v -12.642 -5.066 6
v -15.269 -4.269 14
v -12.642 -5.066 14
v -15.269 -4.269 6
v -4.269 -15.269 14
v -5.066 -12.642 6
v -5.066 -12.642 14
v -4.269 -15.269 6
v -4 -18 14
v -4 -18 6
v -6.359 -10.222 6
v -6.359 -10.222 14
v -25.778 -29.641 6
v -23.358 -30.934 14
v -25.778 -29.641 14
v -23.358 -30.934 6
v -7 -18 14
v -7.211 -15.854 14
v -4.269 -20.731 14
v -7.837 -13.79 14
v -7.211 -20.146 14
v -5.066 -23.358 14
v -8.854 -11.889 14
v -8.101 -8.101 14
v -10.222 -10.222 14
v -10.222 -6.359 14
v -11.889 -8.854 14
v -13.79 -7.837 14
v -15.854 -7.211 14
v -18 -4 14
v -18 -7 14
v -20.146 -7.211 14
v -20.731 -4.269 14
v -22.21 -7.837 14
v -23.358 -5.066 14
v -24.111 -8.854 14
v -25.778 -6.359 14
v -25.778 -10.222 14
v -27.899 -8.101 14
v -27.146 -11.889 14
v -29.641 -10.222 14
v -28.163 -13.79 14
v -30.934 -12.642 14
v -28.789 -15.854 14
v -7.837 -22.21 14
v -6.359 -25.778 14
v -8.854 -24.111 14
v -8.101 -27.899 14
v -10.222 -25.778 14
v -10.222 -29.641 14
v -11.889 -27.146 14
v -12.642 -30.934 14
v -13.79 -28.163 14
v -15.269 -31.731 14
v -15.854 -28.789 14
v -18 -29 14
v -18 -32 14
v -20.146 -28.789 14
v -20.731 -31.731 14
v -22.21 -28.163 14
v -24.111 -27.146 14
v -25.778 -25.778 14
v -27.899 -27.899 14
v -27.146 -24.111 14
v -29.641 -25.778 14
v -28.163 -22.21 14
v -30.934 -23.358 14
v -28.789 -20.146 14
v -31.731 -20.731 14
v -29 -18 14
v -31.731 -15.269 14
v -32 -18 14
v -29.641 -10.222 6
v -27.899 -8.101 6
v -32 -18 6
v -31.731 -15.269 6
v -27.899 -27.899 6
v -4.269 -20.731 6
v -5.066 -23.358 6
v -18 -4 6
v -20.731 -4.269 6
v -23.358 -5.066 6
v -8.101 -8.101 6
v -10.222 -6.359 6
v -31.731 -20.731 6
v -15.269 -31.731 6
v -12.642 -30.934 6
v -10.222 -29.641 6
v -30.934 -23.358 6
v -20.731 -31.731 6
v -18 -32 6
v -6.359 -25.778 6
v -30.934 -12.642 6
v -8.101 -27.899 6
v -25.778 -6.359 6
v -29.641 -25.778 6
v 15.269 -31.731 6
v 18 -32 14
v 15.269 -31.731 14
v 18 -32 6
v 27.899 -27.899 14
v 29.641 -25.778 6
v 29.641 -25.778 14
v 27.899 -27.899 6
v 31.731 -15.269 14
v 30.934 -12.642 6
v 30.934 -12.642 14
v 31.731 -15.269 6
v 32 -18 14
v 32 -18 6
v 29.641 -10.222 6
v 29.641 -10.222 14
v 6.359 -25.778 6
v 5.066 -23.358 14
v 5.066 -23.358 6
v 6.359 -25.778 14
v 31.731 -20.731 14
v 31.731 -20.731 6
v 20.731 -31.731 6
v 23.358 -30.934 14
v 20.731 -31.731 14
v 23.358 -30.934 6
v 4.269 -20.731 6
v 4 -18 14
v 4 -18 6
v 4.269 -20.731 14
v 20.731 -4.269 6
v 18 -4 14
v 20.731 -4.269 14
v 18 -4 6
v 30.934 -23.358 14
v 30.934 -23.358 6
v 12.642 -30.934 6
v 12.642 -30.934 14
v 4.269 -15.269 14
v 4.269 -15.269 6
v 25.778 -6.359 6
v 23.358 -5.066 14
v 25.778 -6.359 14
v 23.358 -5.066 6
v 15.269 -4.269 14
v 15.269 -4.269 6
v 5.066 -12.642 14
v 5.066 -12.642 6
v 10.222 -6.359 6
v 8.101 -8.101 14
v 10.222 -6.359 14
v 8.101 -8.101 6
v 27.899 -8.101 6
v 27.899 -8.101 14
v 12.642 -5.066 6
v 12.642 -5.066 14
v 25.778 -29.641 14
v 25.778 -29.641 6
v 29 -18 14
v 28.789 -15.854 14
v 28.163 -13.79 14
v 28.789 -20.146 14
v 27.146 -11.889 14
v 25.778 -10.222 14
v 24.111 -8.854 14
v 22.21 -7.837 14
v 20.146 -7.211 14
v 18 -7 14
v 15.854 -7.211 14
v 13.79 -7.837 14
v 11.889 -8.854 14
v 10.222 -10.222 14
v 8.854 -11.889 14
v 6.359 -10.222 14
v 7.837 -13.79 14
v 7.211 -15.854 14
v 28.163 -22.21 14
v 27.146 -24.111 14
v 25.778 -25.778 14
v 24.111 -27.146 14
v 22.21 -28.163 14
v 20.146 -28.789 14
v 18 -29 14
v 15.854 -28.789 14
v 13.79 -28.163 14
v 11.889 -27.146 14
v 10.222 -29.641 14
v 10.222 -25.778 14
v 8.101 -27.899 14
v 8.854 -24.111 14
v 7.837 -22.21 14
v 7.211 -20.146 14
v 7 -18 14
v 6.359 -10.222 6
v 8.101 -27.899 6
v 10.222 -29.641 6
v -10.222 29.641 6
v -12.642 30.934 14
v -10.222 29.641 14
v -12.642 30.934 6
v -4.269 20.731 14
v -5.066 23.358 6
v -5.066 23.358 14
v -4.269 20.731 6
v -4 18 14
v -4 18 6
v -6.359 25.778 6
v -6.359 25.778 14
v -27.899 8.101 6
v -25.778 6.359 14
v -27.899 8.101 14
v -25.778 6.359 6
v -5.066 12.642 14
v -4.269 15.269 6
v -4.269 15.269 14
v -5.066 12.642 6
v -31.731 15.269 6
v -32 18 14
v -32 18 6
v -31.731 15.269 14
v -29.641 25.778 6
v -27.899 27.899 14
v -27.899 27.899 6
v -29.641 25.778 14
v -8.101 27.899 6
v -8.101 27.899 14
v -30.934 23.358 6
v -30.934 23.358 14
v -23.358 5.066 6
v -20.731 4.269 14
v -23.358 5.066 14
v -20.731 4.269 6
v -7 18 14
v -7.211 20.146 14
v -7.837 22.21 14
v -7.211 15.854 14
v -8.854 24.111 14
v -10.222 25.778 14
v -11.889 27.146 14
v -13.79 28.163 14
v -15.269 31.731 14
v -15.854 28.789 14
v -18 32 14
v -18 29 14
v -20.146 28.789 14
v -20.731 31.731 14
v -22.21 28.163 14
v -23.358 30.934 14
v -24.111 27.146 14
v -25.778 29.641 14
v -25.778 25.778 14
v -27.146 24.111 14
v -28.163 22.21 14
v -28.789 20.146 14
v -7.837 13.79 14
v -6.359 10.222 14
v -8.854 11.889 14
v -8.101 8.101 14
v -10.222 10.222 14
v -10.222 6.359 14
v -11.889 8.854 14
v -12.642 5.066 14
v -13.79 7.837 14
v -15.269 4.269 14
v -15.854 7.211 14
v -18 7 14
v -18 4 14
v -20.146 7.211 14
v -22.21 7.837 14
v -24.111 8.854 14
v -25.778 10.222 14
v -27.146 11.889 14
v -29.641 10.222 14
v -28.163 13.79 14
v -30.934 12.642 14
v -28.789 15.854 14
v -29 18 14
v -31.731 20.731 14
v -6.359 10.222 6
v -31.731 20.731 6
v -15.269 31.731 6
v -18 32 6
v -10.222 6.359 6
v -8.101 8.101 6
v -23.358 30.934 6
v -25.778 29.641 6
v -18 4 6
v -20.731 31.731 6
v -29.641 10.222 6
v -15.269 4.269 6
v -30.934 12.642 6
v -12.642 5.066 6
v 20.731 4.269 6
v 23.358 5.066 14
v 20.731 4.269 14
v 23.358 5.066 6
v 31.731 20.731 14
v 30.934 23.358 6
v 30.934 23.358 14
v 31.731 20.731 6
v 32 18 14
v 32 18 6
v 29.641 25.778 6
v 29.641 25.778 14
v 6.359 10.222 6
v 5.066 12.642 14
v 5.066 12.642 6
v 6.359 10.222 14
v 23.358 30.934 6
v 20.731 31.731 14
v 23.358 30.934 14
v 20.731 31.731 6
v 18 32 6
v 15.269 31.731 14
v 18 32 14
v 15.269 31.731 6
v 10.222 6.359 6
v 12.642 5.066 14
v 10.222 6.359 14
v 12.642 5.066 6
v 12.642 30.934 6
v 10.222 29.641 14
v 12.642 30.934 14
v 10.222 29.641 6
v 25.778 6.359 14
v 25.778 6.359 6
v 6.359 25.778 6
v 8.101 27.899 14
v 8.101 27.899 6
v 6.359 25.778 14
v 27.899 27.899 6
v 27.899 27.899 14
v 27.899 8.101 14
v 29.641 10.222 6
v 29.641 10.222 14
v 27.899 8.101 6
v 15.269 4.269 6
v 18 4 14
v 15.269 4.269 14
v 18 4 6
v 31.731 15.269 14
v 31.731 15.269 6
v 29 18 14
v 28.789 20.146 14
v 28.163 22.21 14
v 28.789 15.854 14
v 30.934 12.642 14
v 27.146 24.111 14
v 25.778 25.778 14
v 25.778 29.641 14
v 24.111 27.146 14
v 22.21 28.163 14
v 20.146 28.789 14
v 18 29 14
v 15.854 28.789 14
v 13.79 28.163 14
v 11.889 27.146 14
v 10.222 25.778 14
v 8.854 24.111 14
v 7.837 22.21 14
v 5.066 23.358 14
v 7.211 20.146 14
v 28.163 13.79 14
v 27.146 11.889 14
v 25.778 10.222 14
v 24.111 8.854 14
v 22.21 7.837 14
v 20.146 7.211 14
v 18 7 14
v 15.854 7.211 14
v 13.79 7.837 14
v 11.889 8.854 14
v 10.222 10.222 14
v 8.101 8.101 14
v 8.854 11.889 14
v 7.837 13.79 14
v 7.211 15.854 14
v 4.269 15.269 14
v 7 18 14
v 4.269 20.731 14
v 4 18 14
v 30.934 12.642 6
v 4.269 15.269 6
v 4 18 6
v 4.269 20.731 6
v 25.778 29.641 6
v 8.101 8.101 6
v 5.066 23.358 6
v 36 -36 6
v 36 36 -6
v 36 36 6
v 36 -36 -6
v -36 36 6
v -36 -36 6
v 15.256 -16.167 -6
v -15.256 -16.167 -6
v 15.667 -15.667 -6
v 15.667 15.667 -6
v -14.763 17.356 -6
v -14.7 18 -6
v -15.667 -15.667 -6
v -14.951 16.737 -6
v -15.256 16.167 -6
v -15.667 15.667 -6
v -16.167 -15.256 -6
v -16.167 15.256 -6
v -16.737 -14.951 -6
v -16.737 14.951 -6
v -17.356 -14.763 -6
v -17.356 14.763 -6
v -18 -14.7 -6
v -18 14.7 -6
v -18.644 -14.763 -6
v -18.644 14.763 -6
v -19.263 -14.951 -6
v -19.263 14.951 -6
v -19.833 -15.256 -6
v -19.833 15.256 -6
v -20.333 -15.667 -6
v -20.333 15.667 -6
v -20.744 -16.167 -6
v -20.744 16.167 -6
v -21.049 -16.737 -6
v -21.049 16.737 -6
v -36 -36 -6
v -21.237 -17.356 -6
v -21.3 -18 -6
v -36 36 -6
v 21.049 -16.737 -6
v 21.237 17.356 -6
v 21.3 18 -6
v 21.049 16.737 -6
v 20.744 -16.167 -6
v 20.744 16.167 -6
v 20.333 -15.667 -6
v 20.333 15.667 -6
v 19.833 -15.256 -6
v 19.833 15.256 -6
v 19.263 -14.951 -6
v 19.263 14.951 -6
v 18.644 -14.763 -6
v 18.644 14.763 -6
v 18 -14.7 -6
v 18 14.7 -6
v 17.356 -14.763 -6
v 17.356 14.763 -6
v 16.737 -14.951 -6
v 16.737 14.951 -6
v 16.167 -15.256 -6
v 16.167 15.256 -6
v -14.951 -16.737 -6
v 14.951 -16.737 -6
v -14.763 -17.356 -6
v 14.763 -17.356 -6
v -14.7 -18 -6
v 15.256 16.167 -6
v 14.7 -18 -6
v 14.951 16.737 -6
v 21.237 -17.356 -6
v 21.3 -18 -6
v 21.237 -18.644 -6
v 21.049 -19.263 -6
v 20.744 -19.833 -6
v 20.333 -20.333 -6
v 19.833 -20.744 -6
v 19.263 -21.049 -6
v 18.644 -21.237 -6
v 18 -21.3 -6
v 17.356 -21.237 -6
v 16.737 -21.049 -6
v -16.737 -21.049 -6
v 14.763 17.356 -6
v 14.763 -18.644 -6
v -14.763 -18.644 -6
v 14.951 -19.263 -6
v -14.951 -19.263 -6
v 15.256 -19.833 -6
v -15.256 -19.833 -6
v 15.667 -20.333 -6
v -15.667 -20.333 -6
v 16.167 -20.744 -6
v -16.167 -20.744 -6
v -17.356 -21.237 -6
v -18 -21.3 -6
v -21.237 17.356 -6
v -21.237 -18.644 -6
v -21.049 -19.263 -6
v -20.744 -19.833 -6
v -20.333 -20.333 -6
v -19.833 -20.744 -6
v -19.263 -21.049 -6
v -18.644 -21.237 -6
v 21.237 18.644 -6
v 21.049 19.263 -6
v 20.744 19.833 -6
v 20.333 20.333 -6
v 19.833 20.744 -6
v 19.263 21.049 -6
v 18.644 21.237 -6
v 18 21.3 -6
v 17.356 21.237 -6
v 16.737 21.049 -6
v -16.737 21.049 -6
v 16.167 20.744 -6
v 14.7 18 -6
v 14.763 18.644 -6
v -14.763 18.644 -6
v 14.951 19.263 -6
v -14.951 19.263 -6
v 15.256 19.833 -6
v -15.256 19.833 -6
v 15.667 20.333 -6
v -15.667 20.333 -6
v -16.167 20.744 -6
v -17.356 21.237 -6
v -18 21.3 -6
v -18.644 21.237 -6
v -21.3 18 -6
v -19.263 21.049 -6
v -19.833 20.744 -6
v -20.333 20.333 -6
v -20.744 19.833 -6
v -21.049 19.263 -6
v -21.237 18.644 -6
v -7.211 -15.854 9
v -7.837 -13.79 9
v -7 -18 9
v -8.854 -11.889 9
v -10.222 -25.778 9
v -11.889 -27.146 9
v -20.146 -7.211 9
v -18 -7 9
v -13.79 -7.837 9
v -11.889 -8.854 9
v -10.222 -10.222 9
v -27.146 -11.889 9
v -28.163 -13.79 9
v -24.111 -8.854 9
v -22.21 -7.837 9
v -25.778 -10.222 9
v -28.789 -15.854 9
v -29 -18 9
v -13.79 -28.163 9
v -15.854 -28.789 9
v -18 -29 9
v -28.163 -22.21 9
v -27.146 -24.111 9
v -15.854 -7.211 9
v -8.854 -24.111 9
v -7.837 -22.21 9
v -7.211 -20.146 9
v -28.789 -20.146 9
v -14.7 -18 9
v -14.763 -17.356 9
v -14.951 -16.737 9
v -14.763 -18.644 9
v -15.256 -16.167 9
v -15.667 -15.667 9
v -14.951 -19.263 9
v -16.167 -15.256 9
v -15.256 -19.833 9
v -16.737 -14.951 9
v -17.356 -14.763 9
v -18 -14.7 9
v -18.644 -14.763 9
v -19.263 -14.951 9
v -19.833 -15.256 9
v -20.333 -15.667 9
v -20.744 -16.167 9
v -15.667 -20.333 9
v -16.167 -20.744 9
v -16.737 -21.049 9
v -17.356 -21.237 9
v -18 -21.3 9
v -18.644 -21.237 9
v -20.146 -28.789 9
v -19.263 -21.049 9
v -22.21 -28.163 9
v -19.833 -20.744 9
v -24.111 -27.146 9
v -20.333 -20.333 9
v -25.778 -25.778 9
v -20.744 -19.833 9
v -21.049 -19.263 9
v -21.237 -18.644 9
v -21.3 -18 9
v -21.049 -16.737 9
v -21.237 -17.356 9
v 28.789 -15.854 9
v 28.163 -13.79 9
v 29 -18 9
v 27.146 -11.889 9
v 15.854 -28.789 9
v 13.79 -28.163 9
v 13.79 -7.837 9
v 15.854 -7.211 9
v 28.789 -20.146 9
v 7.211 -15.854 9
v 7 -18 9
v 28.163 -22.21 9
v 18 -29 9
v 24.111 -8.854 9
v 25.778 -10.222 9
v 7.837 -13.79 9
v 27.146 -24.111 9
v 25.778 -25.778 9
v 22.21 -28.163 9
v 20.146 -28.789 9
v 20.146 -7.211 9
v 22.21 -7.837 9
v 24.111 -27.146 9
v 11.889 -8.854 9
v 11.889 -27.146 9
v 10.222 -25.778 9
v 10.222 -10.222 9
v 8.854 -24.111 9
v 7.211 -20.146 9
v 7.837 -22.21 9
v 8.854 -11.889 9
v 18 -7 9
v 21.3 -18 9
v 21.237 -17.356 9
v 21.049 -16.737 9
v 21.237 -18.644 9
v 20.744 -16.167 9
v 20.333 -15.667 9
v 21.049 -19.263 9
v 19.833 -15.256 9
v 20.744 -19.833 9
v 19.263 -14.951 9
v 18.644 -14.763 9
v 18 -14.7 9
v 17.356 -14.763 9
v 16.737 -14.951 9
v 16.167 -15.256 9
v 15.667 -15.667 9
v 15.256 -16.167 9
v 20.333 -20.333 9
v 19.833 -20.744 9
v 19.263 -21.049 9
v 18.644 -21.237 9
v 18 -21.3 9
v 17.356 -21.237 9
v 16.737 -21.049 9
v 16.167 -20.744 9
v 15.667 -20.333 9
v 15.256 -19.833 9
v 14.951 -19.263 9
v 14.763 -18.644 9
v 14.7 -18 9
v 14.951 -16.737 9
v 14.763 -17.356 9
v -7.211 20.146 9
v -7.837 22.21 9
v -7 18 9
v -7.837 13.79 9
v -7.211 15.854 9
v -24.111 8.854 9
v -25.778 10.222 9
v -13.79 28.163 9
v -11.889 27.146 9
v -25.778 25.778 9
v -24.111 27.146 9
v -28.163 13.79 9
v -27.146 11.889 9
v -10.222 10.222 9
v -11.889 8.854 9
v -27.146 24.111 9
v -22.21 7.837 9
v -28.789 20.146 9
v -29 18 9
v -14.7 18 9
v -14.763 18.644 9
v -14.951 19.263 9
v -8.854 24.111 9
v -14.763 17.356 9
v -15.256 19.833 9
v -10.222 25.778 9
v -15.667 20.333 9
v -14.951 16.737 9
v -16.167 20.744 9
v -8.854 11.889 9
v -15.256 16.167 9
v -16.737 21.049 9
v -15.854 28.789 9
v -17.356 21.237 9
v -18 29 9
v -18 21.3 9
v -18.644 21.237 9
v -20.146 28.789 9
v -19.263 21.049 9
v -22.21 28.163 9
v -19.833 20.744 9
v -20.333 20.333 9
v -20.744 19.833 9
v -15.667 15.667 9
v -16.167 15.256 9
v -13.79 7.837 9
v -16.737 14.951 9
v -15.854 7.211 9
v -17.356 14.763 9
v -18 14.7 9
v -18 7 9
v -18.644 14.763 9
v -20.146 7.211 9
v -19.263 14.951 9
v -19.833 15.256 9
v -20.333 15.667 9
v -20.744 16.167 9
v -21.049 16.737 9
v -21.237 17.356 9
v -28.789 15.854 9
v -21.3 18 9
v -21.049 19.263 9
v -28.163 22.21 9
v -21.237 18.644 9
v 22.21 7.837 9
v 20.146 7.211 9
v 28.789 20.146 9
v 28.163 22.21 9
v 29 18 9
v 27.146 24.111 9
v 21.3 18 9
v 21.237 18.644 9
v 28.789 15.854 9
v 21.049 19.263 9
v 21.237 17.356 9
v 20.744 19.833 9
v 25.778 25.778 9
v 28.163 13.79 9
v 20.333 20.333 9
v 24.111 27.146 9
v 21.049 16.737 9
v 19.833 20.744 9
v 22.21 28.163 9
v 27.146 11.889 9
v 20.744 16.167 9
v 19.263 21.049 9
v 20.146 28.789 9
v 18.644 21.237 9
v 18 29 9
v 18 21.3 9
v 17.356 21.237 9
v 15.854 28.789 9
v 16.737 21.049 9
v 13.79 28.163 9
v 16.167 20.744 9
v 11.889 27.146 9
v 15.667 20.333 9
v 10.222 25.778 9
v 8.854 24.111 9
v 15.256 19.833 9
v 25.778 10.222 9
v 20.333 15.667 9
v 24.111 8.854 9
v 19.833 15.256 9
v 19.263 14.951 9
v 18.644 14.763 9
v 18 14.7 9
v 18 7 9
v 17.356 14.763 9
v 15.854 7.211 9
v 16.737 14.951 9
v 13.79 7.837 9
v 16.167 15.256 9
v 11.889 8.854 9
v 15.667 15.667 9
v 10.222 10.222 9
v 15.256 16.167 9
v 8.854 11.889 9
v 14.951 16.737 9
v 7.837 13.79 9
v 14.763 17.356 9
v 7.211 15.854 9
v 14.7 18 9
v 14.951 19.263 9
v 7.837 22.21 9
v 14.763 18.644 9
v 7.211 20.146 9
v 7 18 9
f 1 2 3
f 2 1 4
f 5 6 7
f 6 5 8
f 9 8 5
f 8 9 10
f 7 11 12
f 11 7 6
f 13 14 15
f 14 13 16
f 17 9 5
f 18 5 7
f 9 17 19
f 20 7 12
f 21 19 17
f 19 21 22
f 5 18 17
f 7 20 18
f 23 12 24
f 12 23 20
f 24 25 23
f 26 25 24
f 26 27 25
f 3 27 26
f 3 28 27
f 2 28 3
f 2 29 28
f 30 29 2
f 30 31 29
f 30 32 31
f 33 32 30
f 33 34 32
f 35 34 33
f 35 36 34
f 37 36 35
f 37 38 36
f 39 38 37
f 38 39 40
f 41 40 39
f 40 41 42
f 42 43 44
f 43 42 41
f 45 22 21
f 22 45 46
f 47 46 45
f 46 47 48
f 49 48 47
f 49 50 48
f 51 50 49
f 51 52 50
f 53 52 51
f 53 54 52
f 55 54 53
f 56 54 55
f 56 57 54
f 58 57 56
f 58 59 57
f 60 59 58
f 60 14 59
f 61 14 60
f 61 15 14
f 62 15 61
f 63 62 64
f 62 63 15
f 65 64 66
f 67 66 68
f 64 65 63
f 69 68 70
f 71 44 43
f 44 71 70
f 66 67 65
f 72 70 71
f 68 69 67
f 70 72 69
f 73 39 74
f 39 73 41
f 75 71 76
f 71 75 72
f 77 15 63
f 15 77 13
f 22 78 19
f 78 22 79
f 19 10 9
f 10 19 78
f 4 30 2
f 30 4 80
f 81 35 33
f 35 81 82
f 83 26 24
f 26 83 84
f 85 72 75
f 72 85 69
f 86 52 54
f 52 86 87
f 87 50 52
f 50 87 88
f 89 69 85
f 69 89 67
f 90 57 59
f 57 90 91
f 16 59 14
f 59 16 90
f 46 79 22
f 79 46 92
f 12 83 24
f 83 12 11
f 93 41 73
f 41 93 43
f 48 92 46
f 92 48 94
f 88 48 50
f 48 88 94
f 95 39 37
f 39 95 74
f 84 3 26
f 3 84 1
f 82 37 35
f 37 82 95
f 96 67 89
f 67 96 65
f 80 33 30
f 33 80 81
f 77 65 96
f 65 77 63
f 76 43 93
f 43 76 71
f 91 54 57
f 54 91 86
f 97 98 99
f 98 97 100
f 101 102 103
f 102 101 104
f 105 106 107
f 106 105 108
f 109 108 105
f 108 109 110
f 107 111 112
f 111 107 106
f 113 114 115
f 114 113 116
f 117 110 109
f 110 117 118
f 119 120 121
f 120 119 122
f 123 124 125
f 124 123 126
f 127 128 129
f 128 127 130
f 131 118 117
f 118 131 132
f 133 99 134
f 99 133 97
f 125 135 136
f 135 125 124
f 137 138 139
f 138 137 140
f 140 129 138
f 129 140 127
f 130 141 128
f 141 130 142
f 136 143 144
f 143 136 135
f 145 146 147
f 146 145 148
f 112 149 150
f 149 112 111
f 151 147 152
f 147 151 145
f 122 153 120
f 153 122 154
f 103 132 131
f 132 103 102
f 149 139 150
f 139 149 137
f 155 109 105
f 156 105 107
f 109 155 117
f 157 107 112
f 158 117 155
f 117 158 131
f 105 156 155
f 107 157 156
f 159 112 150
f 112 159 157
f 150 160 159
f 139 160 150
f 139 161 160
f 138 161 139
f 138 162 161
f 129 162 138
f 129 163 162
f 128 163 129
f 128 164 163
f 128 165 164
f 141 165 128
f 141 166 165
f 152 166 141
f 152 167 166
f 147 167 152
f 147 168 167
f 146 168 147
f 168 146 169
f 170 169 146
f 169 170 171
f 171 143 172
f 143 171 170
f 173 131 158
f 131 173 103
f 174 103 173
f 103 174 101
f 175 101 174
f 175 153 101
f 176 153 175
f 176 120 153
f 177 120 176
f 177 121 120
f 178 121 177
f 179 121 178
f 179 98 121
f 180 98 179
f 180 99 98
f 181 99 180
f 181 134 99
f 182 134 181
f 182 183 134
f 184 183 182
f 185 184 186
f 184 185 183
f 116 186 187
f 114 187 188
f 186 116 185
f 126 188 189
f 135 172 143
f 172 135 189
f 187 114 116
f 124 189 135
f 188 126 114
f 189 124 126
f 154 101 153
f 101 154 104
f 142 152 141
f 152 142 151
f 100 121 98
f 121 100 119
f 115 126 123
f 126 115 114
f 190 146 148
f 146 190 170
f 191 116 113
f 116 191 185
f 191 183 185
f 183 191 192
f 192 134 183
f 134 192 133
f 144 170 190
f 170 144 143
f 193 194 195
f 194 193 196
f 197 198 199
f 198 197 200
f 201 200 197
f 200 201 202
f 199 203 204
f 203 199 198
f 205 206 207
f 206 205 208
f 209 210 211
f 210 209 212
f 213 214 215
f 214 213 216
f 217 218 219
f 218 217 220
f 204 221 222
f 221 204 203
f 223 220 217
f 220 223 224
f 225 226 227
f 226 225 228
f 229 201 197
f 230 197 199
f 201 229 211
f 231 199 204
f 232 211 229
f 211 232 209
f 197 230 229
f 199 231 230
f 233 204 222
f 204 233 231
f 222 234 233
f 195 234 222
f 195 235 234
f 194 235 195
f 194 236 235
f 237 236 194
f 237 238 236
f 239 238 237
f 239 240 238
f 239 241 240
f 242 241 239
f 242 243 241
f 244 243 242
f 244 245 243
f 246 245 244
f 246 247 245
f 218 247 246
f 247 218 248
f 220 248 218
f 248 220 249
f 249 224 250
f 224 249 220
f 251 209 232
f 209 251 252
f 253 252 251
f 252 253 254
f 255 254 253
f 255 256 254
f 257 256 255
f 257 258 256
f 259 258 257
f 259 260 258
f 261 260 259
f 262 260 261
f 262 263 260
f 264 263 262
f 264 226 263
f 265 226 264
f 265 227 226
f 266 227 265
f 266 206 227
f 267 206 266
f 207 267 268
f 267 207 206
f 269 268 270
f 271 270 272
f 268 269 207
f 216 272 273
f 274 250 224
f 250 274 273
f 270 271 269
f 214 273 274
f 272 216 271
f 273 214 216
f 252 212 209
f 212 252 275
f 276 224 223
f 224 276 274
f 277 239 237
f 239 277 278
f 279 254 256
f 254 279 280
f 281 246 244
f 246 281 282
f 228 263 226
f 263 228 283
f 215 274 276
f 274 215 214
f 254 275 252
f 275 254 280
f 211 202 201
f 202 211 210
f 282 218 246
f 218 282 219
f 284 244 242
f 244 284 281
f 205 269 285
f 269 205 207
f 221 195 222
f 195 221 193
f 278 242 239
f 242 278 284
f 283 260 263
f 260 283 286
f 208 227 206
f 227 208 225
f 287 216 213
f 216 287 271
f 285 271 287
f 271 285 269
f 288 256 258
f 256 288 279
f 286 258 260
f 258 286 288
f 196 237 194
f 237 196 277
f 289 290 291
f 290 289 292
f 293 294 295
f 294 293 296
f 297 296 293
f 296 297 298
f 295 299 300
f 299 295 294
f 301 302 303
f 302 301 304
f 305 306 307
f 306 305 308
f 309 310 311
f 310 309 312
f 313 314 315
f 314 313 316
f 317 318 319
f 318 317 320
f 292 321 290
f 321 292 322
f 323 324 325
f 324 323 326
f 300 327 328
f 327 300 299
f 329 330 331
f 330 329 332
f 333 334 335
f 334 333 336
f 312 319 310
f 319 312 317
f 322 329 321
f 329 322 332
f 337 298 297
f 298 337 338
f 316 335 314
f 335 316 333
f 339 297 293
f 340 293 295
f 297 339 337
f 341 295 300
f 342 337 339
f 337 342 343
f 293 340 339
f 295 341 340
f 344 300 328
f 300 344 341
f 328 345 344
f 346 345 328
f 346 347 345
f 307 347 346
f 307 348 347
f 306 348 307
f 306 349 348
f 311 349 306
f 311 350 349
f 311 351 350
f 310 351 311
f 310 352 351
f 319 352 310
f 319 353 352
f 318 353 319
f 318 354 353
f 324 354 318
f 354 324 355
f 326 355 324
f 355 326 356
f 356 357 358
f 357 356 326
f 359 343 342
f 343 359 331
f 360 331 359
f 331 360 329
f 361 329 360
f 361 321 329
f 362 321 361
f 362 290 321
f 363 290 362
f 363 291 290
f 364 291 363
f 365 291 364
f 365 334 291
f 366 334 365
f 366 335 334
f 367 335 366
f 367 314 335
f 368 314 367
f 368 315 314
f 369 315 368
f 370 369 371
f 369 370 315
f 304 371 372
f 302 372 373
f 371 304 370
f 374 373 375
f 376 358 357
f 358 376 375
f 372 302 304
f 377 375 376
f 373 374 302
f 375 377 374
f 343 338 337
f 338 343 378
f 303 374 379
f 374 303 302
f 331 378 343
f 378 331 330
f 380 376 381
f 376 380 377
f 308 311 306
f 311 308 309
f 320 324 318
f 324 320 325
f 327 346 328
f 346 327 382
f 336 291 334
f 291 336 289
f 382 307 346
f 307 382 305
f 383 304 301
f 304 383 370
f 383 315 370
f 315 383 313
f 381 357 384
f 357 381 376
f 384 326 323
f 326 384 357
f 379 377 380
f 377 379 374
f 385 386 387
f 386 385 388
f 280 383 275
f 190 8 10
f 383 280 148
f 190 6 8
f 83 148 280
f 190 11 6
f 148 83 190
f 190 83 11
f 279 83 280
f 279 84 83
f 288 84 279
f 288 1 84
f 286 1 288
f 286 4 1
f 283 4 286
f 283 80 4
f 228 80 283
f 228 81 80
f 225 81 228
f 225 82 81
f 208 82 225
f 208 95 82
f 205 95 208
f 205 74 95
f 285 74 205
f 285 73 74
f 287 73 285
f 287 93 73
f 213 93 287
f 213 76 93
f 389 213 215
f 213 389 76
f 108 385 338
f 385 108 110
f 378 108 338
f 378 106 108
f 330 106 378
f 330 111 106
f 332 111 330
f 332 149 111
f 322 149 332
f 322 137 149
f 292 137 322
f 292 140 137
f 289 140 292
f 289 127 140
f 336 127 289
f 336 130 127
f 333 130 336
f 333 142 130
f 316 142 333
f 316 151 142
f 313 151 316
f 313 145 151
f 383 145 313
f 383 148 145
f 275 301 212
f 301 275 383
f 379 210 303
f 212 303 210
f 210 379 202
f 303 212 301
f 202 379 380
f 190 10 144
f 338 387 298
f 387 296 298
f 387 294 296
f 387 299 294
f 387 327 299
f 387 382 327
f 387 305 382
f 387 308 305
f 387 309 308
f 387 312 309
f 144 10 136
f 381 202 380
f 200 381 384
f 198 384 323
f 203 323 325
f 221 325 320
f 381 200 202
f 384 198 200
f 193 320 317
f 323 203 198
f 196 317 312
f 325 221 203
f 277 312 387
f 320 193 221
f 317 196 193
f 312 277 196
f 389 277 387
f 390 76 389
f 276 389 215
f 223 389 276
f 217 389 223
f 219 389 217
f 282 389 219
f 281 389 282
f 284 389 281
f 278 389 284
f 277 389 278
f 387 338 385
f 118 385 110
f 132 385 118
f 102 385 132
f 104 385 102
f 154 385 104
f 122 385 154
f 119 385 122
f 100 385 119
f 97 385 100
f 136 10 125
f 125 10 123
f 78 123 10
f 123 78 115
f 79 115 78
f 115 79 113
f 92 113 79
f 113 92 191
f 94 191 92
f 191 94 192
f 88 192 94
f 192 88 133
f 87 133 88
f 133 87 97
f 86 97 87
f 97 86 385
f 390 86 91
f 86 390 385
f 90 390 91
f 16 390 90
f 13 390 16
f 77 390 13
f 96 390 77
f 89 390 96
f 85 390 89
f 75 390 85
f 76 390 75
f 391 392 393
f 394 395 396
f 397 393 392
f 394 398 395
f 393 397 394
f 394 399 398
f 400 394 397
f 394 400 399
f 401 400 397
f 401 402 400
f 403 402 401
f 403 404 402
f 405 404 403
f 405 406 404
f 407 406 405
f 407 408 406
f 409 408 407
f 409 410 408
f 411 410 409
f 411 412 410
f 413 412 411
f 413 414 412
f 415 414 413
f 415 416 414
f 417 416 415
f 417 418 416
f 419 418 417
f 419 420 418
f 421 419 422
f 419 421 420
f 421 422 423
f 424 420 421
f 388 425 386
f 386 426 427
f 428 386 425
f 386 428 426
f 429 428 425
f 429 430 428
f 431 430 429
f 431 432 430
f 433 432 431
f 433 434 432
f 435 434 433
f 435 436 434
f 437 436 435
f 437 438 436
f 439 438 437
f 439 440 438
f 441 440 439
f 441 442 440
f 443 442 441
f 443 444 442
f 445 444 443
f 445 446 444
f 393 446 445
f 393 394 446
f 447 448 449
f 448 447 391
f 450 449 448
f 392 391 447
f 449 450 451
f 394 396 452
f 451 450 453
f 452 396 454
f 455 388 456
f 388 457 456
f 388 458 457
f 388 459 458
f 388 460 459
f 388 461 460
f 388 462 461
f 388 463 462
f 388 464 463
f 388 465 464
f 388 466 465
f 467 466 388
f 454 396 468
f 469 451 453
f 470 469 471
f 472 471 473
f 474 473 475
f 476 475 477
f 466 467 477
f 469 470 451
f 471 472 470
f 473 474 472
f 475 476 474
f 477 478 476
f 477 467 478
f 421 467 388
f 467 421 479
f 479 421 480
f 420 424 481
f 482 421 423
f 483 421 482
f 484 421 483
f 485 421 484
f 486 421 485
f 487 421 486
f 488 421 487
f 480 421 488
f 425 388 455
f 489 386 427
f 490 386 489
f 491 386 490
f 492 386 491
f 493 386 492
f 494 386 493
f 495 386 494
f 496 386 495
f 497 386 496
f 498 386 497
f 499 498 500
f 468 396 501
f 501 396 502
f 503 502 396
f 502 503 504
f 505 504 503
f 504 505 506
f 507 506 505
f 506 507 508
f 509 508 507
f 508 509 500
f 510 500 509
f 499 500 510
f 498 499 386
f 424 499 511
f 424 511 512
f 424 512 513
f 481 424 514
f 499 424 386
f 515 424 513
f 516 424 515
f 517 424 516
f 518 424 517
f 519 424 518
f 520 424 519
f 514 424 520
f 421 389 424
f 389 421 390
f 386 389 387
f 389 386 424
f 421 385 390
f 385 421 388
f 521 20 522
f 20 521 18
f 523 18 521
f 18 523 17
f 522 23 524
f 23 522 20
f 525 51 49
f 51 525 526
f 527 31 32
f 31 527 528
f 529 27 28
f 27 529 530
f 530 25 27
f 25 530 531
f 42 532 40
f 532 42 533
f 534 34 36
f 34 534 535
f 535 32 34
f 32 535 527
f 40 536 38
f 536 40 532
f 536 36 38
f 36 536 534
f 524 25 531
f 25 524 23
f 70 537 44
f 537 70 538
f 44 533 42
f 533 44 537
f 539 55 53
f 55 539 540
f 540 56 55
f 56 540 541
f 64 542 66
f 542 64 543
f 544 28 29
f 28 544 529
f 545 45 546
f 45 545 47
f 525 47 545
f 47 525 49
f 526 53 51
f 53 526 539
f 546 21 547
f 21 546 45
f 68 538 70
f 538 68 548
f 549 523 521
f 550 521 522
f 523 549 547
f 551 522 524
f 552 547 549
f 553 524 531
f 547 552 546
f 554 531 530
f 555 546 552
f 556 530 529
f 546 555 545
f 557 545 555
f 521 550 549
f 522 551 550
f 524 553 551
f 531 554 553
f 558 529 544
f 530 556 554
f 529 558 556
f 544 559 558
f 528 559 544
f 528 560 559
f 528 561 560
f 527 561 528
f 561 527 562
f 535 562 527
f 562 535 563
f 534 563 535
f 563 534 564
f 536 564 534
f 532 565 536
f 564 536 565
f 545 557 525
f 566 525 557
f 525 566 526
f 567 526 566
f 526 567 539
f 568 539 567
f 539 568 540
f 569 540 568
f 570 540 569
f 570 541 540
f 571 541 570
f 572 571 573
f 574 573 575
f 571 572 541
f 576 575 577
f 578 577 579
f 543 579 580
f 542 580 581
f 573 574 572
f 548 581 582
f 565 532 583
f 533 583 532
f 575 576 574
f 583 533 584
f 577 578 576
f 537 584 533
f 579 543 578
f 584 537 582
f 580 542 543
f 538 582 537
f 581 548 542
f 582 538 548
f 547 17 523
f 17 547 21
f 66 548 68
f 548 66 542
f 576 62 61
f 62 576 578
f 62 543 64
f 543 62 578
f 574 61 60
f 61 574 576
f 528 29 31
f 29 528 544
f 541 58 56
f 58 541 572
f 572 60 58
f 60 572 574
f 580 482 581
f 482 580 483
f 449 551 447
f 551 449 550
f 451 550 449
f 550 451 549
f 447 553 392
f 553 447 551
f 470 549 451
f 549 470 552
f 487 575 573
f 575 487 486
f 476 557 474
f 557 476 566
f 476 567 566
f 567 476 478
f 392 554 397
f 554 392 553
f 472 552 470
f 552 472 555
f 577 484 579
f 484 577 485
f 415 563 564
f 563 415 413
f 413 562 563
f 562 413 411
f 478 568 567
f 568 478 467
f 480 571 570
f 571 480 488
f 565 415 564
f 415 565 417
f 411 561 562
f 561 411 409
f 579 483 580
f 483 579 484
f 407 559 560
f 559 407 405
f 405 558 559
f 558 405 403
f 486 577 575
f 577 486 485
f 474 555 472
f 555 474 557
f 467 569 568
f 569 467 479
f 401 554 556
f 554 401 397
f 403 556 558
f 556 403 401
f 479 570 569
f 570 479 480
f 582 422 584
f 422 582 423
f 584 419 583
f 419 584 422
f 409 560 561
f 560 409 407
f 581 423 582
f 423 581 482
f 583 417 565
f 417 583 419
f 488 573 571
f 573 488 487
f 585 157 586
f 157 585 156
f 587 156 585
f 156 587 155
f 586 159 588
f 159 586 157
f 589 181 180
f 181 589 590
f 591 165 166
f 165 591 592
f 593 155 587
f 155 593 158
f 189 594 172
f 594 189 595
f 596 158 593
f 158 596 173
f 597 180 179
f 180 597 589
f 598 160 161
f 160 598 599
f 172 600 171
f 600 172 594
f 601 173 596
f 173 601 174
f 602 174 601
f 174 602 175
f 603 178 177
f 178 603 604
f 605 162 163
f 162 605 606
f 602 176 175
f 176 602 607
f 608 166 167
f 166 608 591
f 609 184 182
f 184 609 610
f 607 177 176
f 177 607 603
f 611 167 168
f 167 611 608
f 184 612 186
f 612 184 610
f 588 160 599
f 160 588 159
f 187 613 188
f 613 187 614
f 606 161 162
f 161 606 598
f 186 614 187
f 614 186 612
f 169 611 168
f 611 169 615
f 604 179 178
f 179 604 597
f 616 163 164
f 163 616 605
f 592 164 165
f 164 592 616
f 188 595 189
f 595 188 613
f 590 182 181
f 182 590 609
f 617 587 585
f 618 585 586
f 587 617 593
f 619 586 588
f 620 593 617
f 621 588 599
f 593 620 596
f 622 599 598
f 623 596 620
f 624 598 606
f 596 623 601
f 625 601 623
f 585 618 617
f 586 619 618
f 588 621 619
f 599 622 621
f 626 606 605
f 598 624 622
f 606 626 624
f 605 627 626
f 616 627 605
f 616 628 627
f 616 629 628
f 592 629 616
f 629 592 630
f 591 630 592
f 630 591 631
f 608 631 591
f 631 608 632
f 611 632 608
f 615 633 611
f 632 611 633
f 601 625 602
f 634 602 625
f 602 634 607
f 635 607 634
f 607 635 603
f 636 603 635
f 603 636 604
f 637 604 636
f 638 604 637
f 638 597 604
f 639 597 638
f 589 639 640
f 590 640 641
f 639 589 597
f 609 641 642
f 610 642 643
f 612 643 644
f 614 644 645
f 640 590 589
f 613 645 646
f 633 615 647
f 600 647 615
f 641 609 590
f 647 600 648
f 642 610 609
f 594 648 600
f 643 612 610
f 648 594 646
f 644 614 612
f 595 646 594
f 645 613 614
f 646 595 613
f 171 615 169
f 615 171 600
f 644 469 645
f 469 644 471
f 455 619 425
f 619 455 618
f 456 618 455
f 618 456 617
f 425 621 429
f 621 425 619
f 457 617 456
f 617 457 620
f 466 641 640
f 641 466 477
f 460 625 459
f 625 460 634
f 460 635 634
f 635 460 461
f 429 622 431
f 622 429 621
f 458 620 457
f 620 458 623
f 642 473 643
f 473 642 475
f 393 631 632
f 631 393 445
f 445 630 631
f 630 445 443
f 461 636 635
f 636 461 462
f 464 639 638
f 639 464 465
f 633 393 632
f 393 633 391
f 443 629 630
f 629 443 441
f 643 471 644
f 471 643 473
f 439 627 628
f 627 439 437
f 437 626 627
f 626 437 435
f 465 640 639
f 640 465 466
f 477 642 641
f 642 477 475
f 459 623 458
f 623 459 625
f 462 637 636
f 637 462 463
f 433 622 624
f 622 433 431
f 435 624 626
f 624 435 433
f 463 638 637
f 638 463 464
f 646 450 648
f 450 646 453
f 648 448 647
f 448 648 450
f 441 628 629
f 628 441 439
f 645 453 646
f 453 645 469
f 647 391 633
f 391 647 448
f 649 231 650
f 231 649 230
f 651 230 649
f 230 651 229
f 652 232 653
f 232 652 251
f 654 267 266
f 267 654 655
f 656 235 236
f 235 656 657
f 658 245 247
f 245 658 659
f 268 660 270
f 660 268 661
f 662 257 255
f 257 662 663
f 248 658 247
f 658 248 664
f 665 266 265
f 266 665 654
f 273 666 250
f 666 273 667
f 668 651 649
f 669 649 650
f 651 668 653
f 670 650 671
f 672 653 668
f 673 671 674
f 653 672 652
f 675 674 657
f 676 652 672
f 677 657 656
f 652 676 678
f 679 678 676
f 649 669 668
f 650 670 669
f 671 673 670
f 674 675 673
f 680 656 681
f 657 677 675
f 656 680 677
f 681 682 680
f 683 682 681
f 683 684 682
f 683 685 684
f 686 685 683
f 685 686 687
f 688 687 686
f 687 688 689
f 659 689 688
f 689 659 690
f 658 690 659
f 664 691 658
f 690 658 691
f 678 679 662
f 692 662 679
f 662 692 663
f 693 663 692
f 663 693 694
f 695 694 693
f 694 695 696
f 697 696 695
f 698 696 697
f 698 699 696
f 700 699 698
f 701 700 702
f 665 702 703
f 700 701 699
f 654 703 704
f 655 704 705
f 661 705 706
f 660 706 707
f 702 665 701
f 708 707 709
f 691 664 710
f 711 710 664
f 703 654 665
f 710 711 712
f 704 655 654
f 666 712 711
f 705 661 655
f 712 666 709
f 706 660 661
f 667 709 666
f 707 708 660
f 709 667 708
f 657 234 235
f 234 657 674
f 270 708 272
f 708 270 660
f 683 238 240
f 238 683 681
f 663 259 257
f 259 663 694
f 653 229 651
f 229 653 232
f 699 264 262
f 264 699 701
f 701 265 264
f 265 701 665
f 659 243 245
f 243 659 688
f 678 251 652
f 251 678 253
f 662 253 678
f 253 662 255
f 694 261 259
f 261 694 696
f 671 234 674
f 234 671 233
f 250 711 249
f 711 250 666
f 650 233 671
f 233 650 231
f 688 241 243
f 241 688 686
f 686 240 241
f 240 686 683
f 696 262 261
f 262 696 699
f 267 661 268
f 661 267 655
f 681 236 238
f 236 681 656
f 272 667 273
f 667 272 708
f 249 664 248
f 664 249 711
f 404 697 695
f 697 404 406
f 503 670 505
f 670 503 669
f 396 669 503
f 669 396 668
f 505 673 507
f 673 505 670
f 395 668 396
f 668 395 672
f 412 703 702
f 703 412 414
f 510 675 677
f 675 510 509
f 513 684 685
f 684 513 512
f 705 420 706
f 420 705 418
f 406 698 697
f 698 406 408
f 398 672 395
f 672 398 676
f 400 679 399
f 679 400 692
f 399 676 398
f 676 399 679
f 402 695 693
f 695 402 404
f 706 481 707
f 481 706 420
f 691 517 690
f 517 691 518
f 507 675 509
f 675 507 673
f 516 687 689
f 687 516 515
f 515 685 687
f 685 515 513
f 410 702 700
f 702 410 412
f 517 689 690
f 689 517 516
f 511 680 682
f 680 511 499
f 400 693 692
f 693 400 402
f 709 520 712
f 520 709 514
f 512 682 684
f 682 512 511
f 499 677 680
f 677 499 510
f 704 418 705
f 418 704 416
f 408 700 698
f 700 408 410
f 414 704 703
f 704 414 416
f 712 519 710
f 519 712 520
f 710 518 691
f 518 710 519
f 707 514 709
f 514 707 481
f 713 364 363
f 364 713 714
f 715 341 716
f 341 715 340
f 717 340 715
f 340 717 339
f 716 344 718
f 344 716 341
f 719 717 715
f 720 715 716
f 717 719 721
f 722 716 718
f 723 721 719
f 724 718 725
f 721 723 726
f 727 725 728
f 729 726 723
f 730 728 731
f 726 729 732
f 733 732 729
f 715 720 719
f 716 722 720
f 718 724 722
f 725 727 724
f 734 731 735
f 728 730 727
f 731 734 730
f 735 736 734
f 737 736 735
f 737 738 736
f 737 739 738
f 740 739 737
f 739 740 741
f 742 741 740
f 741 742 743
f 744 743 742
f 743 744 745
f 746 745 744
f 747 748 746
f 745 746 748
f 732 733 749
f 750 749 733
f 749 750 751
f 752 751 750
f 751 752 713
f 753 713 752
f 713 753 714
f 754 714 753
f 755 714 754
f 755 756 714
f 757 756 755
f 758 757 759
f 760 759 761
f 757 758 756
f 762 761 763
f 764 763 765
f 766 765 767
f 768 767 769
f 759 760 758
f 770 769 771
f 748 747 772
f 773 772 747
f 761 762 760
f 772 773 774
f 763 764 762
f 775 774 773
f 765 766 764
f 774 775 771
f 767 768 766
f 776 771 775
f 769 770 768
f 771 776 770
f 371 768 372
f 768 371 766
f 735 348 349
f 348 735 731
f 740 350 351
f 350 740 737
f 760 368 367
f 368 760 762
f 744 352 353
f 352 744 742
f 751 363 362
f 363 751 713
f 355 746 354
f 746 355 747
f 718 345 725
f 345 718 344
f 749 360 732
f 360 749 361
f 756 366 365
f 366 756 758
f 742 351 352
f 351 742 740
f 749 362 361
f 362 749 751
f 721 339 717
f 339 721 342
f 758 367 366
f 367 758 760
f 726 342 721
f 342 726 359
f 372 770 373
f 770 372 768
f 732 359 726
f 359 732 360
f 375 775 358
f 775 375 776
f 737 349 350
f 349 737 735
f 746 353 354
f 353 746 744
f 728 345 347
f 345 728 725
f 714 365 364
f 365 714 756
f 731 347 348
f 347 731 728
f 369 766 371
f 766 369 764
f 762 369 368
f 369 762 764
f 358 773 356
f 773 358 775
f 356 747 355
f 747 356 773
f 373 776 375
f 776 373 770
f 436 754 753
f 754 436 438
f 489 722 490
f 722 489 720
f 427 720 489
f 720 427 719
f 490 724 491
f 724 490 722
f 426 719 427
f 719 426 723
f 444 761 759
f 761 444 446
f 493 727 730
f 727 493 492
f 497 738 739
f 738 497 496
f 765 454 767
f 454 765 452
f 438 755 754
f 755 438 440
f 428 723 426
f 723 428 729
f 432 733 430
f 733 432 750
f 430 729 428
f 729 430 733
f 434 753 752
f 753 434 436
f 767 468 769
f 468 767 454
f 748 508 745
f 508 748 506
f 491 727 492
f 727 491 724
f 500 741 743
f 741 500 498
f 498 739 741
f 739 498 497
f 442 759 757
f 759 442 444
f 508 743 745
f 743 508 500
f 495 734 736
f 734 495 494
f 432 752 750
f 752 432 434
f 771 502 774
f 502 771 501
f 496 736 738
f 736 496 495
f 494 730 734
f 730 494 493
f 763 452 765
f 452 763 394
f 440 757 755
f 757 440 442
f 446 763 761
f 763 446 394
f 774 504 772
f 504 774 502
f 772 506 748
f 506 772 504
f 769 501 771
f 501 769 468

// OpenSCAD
$fn = 32;

// ----------------------------------------------------------------------
// Socket pad plate
// bosses with counterbored sockets for the screws
// ----------------------------------------------------------------------

// --- parameters (mm) ---
base_t = 12;       // base plate thickness
boss_h = 8;        // boss height above the base plate
boss_d = 28;       // boss diameter
socket_d = 22;     // socket diameter
socket_depth = 5;  // socket depth from the boss face
bolt_d = 6.6;      // screw clearance hole through the socket floor
rows = 2;          // boss rows
cols = 2;          // bosses per row
pitch = 36;        // boss pitch

// --- derived feature positions (mm) ---
height = base_t + boss_h;           // = 20   overall height of the part
plate = [pitch * (cols - 1) + boss_d + 8, pitch * (rows - 1) + boss_d + 8, base_t];  // = [72, 72, 12]   overall size (x, y, z)
span_x = pitch * (cols - 1);        // = 36   distance between outer bosses
span_y = pitch * (rows - 1);        // = 36   distance between boss rows
origin_x = -span_x / 2;             // = -18   X of the first boss
origin_y = -span_y / 2;             // = -18   Y of the first boss
feature_centers = [
  [origin_x + 0 * pitch, origin_y + 0 * pitch],
  [origin_x + 1 * pitch, origin_y + 0 * pitch],
  [origin_x + 0 * pitch, origin_y + 1 * pitch],
  [origin_x + 1 * pitch, origin_y + 1 * pitch]
];   // boss centres: sockets, holes and the pads themselves are placed from here

// base plate, bosses on feature_centers, socket + through hole in each
difference() {
  union() {
    cube(plate, center = true);
    for (centre = feature_centers)
      translate([centre[0], centre[1], plate[2] / 2 - 1])
        cylinder(d = boss_d, h = boss_h + 1);
  }
  for (centre = feature_centers) {
    translate([centre[0], centre[1], plate[2] / 2 + boss_h - socket_depth])
      cylinder(d = socket_d, h = socket_depth + 1);
    translate([centre[0], centre[1], -height])
      cylinder(d = bolt_d, h = 2 * height + 2);  // through the socket floor
  }
}
